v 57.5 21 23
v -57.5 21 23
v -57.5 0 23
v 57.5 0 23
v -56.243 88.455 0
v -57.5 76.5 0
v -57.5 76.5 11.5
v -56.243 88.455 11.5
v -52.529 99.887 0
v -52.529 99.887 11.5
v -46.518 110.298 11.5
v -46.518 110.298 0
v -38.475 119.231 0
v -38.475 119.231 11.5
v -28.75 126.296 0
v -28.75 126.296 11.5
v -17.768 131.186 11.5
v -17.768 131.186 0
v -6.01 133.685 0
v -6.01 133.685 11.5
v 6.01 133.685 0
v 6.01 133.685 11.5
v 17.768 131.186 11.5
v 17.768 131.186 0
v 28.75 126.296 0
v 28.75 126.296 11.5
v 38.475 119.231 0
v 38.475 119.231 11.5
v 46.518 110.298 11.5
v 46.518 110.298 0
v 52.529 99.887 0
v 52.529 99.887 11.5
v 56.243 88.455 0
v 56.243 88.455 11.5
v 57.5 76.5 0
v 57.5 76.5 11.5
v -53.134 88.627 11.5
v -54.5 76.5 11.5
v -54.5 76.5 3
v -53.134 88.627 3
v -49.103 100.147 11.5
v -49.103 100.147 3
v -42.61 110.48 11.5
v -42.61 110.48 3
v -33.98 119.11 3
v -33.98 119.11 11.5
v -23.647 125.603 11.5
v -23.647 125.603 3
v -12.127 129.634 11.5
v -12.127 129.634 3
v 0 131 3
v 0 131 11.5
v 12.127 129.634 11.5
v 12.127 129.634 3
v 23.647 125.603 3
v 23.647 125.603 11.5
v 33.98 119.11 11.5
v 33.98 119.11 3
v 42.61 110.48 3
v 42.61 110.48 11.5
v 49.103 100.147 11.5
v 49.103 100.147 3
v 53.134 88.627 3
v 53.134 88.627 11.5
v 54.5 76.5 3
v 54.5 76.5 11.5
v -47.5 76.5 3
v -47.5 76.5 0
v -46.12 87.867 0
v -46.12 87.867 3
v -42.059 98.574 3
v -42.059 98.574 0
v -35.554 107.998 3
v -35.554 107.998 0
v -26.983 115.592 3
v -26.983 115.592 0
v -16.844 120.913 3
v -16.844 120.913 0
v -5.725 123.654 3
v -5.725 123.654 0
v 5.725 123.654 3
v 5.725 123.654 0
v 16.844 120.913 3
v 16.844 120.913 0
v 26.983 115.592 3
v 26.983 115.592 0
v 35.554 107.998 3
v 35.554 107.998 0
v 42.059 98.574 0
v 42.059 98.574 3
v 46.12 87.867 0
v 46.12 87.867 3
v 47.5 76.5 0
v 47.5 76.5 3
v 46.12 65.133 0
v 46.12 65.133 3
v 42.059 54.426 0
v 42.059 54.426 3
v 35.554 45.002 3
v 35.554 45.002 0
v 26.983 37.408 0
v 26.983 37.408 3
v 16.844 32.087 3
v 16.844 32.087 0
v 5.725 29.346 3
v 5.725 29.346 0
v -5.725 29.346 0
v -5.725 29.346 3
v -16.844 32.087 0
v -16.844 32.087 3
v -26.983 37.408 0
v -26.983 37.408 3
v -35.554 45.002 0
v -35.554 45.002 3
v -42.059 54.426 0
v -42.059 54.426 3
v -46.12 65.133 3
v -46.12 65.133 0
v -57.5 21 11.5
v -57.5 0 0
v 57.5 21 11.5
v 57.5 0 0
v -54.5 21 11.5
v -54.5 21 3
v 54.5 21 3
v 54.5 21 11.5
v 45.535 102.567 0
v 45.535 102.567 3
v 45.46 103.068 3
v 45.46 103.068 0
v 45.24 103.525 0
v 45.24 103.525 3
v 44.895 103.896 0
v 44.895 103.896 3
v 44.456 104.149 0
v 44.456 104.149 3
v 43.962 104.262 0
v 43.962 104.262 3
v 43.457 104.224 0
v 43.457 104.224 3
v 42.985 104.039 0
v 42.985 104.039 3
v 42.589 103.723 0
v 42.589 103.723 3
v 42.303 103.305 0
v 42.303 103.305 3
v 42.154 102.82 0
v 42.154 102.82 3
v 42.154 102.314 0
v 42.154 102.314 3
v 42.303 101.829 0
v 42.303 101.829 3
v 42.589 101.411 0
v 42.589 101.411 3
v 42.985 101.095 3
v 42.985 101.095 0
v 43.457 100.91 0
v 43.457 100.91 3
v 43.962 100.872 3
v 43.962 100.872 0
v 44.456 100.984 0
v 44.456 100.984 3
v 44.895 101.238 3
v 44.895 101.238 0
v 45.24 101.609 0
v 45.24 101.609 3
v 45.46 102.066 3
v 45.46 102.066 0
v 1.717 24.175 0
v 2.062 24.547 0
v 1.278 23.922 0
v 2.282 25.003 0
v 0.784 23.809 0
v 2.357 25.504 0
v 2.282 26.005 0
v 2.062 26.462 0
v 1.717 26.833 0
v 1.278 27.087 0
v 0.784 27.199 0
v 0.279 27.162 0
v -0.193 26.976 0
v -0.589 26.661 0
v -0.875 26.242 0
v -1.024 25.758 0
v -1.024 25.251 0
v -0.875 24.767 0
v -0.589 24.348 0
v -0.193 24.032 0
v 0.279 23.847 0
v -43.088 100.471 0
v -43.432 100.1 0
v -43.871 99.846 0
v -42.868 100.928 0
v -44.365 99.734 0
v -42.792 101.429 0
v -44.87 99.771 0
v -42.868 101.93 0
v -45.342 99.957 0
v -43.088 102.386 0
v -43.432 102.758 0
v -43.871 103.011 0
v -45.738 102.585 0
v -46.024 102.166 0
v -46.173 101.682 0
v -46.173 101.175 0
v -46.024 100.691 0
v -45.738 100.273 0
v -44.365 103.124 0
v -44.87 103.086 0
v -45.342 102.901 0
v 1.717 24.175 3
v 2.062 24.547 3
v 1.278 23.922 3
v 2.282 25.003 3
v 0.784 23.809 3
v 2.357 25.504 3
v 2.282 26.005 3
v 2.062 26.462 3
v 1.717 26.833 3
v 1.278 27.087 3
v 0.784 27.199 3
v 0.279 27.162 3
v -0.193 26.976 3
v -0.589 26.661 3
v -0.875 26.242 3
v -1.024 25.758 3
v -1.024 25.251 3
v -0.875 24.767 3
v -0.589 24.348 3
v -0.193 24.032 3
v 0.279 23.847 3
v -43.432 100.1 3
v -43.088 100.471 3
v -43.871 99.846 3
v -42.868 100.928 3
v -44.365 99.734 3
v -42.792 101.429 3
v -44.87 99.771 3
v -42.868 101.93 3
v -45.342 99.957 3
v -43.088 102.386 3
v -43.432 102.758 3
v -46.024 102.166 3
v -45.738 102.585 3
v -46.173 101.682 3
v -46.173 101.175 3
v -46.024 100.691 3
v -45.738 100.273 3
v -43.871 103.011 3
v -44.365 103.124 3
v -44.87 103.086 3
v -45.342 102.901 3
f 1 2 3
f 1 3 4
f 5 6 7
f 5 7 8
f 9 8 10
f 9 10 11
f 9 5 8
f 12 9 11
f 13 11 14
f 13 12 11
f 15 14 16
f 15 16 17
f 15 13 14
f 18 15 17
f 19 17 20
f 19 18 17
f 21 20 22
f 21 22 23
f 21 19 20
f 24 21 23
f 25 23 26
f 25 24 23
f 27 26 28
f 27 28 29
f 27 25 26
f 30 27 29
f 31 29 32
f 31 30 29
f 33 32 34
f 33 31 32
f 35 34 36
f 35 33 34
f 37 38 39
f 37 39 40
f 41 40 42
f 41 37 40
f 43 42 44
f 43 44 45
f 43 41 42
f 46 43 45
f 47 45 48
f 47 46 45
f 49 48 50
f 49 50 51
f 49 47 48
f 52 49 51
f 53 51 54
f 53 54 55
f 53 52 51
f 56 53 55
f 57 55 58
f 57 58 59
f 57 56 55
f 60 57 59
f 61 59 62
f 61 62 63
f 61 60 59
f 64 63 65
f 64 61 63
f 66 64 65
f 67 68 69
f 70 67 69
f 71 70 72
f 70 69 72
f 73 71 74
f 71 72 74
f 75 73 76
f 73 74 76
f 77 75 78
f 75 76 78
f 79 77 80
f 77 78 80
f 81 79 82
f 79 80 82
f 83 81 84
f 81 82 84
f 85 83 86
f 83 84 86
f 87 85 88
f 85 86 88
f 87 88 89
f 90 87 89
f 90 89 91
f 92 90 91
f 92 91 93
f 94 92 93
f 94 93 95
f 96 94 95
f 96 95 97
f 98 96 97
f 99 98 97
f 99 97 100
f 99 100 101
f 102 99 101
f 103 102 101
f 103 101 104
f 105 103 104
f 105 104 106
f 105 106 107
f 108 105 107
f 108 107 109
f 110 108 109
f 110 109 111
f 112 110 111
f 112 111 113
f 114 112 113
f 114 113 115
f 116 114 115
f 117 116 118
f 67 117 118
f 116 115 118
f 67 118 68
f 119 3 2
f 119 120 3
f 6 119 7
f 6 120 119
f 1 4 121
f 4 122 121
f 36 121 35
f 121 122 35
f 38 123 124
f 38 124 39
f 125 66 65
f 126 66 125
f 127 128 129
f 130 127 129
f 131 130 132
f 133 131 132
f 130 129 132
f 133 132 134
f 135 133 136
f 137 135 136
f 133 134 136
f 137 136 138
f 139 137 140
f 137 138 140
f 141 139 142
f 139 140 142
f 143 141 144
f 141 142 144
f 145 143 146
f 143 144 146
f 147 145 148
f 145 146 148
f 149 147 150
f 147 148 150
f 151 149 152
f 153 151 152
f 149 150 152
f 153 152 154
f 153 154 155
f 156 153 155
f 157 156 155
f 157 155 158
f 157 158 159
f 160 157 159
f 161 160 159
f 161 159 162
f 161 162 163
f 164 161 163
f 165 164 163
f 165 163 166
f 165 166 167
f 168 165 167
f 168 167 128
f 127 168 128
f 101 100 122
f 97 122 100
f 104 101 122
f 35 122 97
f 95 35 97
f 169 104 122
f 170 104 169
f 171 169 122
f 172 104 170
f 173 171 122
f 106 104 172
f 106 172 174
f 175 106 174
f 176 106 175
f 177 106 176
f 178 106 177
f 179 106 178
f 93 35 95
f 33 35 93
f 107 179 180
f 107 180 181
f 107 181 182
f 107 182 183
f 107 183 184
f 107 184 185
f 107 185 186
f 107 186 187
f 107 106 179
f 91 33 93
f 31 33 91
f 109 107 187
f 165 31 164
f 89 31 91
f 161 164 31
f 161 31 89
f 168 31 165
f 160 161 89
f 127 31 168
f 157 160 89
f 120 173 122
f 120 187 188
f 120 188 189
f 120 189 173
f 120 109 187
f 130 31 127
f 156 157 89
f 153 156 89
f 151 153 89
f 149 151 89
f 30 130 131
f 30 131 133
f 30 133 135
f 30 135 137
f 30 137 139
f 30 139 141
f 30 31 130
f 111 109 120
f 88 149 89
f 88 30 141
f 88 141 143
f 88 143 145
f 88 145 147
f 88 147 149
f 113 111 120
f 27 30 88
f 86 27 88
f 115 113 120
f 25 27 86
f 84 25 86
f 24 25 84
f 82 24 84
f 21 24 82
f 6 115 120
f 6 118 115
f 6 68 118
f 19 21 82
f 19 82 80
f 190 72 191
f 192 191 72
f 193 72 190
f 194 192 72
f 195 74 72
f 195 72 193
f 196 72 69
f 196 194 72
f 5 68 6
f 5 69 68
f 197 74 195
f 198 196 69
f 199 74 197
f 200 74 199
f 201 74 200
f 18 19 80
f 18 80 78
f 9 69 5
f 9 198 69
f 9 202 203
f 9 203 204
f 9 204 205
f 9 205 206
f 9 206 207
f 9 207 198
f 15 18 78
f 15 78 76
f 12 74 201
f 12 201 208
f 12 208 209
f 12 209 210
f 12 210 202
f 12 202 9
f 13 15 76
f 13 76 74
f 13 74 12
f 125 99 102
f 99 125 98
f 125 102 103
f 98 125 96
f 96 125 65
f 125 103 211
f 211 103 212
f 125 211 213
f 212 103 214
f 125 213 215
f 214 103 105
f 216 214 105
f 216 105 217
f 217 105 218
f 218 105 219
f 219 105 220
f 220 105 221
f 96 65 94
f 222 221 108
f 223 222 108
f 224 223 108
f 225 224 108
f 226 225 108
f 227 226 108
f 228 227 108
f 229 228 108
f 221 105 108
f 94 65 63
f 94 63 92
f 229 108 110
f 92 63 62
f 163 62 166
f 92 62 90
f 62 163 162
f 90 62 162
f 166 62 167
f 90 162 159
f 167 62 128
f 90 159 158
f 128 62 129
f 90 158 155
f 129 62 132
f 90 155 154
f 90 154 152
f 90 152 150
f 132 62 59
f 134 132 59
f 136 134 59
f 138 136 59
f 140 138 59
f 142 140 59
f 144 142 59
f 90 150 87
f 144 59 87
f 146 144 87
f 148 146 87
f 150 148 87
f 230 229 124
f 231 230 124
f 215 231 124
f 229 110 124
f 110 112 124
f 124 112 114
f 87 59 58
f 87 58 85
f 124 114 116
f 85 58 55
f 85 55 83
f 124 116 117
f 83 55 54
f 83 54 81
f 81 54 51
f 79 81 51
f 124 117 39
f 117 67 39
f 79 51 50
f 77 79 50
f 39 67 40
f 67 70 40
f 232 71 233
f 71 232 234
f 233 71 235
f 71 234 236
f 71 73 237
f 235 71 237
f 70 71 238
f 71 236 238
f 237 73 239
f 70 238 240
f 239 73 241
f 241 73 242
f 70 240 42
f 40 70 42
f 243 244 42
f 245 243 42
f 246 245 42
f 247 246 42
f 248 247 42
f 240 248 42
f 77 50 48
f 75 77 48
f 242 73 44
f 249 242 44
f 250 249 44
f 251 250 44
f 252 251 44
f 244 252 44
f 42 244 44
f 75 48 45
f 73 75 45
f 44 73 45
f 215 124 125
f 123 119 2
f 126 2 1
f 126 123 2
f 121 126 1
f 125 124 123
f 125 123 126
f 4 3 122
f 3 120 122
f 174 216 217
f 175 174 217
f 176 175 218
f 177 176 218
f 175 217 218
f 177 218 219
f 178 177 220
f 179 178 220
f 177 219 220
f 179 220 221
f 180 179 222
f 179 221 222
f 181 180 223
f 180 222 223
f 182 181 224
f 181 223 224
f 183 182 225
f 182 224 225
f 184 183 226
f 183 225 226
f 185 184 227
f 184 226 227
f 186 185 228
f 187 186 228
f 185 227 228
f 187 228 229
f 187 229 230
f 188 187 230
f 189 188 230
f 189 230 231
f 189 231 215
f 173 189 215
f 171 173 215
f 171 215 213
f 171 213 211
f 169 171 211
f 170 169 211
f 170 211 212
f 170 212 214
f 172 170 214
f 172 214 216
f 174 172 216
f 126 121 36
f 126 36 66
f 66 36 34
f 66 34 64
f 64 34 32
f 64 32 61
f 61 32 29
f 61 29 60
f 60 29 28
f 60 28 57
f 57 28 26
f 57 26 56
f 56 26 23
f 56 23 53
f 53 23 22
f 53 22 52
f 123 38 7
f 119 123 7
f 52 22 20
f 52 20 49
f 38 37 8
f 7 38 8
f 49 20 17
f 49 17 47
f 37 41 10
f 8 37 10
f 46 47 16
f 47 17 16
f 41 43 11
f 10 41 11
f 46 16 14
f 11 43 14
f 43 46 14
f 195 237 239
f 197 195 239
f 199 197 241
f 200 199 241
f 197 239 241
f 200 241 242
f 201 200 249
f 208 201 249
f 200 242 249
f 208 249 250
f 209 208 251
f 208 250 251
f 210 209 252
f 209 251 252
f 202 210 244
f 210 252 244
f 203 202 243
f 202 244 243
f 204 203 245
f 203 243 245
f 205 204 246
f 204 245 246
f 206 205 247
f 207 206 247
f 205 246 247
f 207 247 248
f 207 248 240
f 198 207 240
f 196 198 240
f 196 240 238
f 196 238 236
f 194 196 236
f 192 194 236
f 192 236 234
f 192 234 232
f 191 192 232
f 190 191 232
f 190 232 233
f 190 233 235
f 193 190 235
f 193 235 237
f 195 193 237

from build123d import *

# Parameters (mm, degrees)
BOSS_EXTRU_1_DEPTH      = 11.5
ESQUISSE2_W             = 115
ESQUISSE2_H             = 21
BOSS_EXTRU_2_DEPTH      = 11.5
ENL_V_MAT_EXTRU_1_DEPTH = 8.5
ESQUISSE4_R             = 47.5
ENL_V_MAT_EXTRU_2_DEPTH = 148.618596389
D_GAGEMENT_M31_D        = 3.4


with BuildPart() as part:
    # Esquisse1 → Boss.-Extru.1 (new body)
    with BuildSketch(Plane.XY):
        with BuildLine():
            Line((57.5, 0), (-57.5, 0))
            Line((-57.5, 0), (-57.5, 76.5))
            ThreePointArc((-57.5, 76.5), (0, 134), (57.5, 76.5))
            Line((57.5, 76.5), (57.5, 0))
        make_face()
    extrude(amount=BOSS_EXTRU_1_DEPTH)

    # Esquisse2 → Boss.-Extru.2 (add)
    with BuildSketch(Plane.XY.offset(11.5)):
        with Locations((0, 10.5)):
            Rectangle(ESQUISSE2_W, ESQUISSE2_H)
    extrude(amount=BOSS_EXTRU_2_DEPTH)

    # Esquisse3 → Enlèv. mat.-Extru.1 (cut)
    with BuildSketch(Plane.XY.offset(11.5)):
        with BuildLine():
            Line((-54.5, 21), (-54.5, 76.5))
            ThreePointArc((-54.5, 76.5), (0, 131), (54.5, 76.5))
            Line((54.5, 76.5), (54.5, 21))
            Line((54.5, 21), (-54.5, 21))
        make_face()
    extrude(amount=-ENL_V_MAT_EXTRU_1_DEPTH, mode=Mode.SUBTRACT)

    # Esquisse4 → Enlèv. mat.-Extru.2 (cut, through all)
    with BuildSketch(Plane(origin=(0, 0, 0), x_dir=(-1, 0, 0), z_dir=(0, 0, -1))):
        with Locations((0, 76.5)):
            Circle(ESQUISSE4_R)
    extrude(amount=-ENL_V_MAT_EXTRU_2_DEPTH, mode=Mode.SUBTRACT)

    # Dégagement M31 (through all)
    with Locations(Plane(origin=(0, 0, 0), x_dir=(-1, 0, 0), z_dir=(0, 0, -1))):
        with Locations((-43.835096885, 102.566919286), (44.492162743, 101.428847837), (-0.657065858, 25.504232877)):
            Hole(D_GAGEMENT_M31_D / 2)


solid = part.part
